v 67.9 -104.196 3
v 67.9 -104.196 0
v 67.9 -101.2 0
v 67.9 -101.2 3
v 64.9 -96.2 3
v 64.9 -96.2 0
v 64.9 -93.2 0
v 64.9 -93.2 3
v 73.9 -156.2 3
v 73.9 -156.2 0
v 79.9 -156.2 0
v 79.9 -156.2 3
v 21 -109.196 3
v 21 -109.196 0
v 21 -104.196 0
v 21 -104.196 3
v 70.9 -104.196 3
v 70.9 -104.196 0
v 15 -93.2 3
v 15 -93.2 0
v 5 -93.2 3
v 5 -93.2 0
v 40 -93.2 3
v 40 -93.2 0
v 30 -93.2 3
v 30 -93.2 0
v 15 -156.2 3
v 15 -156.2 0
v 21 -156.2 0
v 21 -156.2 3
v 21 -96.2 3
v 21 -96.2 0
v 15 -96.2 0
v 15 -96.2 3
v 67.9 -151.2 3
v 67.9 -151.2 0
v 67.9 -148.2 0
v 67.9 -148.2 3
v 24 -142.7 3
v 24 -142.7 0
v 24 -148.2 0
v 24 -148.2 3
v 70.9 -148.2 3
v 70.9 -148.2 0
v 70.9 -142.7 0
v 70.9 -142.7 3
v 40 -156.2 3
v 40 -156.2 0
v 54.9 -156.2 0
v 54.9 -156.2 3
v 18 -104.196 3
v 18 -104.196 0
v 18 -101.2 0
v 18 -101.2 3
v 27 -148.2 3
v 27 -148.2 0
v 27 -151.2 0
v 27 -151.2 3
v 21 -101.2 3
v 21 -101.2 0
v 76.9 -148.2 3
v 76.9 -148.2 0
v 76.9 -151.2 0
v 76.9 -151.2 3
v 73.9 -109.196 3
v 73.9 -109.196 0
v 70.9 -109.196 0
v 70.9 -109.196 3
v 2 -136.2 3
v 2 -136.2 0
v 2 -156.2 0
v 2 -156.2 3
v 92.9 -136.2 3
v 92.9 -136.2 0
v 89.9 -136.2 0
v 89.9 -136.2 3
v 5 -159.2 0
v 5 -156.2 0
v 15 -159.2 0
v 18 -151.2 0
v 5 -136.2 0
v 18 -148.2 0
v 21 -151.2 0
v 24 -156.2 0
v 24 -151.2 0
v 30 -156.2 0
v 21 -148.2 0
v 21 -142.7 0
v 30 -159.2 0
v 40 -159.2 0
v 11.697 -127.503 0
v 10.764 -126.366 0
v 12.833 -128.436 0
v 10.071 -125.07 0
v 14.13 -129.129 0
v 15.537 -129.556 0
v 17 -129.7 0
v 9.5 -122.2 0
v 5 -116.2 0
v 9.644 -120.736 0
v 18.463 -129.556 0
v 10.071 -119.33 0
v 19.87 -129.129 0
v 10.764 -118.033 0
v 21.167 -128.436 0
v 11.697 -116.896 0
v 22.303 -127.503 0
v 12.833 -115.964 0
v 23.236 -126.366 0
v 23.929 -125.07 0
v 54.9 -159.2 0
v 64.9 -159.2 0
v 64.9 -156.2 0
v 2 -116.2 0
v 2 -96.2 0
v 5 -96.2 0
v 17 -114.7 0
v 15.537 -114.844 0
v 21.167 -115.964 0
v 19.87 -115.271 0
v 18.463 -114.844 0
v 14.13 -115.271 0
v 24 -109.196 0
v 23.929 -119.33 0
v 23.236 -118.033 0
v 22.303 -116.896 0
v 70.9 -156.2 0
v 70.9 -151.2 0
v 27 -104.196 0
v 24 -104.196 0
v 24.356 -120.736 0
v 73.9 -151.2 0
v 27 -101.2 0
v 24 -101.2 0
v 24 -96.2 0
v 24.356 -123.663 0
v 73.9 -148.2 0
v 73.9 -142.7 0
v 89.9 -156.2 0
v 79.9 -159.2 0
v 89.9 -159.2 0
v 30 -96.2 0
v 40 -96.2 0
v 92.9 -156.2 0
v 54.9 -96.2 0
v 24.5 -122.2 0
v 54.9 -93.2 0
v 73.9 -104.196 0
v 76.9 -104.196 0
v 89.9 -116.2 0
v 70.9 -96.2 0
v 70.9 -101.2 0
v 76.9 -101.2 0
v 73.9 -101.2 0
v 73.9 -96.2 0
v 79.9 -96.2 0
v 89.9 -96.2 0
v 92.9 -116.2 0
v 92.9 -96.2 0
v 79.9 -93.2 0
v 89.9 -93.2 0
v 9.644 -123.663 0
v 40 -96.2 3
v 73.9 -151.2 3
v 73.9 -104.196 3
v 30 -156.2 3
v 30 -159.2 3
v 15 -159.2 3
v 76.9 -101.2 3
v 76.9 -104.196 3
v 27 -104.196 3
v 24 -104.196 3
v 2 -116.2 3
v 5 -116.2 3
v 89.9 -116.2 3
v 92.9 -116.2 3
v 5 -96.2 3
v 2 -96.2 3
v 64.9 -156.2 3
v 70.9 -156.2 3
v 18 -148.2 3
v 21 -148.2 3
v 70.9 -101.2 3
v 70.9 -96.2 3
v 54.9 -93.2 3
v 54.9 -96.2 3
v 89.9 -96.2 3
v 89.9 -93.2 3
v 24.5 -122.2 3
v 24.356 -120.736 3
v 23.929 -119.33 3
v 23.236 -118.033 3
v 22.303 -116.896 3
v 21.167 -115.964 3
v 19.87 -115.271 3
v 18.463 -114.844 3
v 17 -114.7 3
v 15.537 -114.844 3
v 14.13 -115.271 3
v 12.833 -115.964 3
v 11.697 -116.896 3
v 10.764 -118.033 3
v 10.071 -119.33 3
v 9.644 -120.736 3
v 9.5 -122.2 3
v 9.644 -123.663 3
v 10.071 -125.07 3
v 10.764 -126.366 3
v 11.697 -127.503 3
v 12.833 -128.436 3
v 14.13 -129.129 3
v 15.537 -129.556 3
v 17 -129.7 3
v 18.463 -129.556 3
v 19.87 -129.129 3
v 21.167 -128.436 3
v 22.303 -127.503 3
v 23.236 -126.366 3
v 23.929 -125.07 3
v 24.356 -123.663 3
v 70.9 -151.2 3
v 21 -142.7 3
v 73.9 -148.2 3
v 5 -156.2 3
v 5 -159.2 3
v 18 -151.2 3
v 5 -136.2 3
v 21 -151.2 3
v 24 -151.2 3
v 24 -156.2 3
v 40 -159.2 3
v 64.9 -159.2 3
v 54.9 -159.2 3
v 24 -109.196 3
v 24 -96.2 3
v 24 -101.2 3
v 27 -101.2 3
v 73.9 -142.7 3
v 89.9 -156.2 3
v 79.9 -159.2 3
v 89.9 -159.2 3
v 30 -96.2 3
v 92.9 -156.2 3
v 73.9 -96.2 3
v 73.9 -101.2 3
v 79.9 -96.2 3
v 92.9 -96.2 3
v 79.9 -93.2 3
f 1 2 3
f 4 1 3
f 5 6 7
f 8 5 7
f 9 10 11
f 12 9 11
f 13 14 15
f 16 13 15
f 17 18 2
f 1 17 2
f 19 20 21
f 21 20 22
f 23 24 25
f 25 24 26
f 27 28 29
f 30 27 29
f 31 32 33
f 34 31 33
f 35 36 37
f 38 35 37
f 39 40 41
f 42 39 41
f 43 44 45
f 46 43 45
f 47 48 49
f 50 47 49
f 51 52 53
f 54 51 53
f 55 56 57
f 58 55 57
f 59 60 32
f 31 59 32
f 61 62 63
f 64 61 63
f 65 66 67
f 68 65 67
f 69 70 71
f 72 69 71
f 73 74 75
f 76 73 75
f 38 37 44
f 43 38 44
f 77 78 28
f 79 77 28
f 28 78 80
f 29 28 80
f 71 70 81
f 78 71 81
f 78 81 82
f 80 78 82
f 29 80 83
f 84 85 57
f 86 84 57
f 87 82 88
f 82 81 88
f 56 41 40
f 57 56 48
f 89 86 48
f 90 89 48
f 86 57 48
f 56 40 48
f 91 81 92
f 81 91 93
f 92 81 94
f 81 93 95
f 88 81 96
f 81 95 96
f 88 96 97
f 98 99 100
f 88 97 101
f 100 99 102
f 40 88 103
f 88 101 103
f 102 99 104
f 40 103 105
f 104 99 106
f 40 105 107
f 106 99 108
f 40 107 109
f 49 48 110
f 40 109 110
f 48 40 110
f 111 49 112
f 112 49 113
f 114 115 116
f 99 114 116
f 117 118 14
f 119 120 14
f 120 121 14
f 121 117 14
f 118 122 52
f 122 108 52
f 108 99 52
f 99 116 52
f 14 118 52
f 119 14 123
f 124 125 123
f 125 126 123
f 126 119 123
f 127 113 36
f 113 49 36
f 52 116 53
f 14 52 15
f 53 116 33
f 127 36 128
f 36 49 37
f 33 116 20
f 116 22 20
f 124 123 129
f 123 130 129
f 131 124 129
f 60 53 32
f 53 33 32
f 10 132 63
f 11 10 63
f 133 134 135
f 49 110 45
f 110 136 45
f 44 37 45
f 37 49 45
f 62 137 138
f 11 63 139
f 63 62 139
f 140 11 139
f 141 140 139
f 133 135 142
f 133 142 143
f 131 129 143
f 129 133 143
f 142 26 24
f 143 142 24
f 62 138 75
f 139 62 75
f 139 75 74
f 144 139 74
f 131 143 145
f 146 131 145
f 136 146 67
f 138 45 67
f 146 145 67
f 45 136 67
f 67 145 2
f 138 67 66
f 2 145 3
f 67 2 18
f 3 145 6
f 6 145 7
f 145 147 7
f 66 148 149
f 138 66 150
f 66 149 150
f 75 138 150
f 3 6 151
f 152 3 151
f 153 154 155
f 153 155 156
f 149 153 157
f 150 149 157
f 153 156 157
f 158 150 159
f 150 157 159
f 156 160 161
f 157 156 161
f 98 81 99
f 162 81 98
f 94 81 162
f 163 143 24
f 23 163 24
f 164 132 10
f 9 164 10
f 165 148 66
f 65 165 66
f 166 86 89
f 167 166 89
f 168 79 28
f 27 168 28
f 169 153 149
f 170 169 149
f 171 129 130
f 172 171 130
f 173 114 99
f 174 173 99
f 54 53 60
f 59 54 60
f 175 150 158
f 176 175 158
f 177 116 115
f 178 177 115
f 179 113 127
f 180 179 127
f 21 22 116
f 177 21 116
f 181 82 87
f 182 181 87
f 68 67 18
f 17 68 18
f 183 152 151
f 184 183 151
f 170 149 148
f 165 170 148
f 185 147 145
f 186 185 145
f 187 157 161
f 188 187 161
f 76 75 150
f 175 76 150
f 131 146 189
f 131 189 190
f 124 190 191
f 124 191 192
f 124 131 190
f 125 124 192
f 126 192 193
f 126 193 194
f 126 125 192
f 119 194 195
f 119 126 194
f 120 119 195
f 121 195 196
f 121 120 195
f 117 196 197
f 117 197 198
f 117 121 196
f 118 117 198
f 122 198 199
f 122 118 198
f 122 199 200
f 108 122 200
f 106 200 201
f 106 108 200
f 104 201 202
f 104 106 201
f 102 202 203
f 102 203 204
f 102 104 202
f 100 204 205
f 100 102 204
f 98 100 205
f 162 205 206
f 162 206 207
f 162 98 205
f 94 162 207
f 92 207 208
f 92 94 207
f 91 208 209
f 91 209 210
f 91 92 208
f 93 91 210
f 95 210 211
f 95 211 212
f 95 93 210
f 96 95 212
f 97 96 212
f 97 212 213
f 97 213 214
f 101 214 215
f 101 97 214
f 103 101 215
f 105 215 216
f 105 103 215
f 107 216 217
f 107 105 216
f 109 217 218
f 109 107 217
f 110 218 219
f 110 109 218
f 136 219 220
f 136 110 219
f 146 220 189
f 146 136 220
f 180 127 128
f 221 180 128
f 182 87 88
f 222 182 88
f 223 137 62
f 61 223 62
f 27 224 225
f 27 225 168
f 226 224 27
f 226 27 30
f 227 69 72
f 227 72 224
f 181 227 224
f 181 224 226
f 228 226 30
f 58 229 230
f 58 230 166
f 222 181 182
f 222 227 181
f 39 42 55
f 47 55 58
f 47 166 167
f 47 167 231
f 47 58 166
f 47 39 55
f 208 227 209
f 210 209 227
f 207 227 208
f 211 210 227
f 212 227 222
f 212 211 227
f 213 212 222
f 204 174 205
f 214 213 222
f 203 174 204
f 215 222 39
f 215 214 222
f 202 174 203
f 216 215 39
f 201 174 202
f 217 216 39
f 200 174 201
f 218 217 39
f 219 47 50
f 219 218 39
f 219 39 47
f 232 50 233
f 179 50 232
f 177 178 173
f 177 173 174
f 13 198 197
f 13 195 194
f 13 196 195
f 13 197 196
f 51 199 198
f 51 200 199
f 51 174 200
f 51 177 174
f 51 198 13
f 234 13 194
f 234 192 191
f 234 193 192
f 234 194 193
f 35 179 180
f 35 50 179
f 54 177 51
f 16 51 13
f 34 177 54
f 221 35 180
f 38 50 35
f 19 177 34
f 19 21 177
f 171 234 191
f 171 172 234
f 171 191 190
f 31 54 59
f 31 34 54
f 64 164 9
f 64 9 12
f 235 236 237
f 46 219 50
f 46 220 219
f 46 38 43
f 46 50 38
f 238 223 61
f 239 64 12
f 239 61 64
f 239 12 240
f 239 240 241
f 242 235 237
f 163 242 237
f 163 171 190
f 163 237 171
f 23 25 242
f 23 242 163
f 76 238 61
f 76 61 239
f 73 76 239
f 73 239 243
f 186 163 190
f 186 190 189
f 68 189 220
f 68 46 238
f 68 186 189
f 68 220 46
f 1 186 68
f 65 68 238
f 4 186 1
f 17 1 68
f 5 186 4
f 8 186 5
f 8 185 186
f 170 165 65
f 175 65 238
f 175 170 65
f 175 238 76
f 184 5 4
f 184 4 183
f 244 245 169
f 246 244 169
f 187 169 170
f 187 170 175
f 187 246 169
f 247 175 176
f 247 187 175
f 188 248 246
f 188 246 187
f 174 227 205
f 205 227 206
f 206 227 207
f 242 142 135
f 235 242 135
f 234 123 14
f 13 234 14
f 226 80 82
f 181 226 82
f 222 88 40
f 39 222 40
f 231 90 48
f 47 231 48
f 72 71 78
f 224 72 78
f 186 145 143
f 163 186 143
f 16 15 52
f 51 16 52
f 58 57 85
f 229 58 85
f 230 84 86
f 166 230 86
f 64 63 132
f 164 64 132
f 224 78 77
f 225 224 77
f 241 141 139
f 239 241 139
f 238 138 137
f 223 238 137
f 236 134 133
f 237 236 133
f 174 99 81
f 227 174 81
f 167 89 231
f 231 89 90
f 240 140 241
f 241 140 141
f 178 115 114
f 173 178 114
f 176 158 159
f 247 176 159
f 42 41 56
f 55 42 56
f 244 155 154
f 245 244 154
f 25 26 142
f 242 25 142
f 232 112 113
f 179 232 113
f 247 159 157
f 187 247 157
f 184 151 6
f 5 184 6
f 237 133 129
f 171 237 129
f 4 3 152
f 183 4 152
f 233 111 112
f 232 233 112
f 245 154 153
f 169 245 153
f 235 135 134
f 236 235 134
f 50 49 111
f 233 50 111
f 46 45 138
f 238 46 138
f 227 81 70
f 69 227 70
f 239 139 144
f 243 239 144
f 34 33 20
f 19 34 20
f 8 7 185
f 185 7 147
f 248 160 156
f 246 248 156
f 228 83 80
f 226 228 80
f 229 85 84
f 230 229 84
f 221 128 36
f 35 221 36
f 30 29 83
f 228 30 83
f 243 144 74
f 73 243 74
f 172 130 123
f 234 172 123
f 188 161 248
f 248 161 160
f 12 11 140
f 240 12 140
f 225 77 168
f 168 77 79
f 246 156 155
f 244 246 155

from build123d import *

# Parameters (mm, degrees)
MODEL_R             = 7.5
BOSS_EXTRUDE1_DEPTH = 3


with BuildPart() as part:
    # Model → Boss-Extrude1 (new body)
    with BuildSketch(Plane.XY):
        Polygon((21, -151.199653678), (18, -151.199653678), (18, -148.199653678), (21, -148.199653678), (21, -142.699653678), (24, -142.699653678), (24, -148.199653678), (27, -148.199653678), (27, -151.199653678), (24, -151.199653678), (24, -156.199653678), (30, -156.199653678), (30, -159.199653678), (40, -159.199653678), (40, -156.199653678), (54.9, -156.199653678), (54.9, -159.199653678), (64.9, -159.199653678), (64.9, -156.199653678), (70.9, -156.199653678), (70.9, -151.199653678), (67.9, -151.199653678), (67.9, -148.199653678), (70.9, -148.199653678), (70.9, -142.699653678), (73.9, -142.699653678), (73.9, -148.199653678), (76.9, -148.199653678), (76.9, -151.199653678), (73.9, -151.199653678), (73.9, -156.199653678), (79.9, -156.199653678), (79.9, -159.199653678), (89.9, -159.199653678), (89.9, -156.199653678), (92.9, -156.199653678), (92.9, -136.199653678), (89.9, -136.199653678), (89.9, -116.199653678), (92.9, -116.199653678), (92.9, -96.199653678), (89.9, -96.199653678), (89.9, -93.199653678), (79.9, -93.199653678), (79.9, -96.199653678), (73.9, -96.199653678), (73.9, -101.199653678), (76.9, -101.199653678), (76.9, -104.196392179), (73.9, -104.196392179), (73.9, -109.196392179), (70.9, -109.196392179), (70.9, -104.196392179), (67.9, -104.196392179), (67.9, -101.199653678), (70.9, -101.199653678), (70.9, -96.199653678), (64.9, -96.199653678), (64.9, -93.199653678), (54.9, -93.199653678), (54.9, -96.199653678), (40, -96.199653678), (40, -93.199653678), (30, -93.199653678), (30, -96.199653678), (24, -96.199653678), (24, -101.199653678), (27, -101.199653678), (27, -104.196392179), (24, -104.196392179), (24, -109.196392179), (21, -109.196392179), (21, -104.196392179), (18, -104.196392179), (18, -101.199653678), (21, -101.199653678), (21, -96.199653678), (15, -96.199653678), (15, -93.199653678), (5, -93.199653678), (5, -96.199653678), (2, -96.199653678), (2, -116.199653678), (5, -116.199653678), (5, -136.199653678), (2, -136.199653678), (2, -156.199653678), (5, -156.199653678), (5, -159.199653678), (15, -159.199653678), (15, -156.199653678), (21, -156.199653678), align=None)
        with Locations((17, -122.199653678)):
            Circle(MODEL_R, mode=Mode.SUBTRACT)
    extrude(amount=BOSS_EXTRUDE1_DEPTH)


solid = part.part
